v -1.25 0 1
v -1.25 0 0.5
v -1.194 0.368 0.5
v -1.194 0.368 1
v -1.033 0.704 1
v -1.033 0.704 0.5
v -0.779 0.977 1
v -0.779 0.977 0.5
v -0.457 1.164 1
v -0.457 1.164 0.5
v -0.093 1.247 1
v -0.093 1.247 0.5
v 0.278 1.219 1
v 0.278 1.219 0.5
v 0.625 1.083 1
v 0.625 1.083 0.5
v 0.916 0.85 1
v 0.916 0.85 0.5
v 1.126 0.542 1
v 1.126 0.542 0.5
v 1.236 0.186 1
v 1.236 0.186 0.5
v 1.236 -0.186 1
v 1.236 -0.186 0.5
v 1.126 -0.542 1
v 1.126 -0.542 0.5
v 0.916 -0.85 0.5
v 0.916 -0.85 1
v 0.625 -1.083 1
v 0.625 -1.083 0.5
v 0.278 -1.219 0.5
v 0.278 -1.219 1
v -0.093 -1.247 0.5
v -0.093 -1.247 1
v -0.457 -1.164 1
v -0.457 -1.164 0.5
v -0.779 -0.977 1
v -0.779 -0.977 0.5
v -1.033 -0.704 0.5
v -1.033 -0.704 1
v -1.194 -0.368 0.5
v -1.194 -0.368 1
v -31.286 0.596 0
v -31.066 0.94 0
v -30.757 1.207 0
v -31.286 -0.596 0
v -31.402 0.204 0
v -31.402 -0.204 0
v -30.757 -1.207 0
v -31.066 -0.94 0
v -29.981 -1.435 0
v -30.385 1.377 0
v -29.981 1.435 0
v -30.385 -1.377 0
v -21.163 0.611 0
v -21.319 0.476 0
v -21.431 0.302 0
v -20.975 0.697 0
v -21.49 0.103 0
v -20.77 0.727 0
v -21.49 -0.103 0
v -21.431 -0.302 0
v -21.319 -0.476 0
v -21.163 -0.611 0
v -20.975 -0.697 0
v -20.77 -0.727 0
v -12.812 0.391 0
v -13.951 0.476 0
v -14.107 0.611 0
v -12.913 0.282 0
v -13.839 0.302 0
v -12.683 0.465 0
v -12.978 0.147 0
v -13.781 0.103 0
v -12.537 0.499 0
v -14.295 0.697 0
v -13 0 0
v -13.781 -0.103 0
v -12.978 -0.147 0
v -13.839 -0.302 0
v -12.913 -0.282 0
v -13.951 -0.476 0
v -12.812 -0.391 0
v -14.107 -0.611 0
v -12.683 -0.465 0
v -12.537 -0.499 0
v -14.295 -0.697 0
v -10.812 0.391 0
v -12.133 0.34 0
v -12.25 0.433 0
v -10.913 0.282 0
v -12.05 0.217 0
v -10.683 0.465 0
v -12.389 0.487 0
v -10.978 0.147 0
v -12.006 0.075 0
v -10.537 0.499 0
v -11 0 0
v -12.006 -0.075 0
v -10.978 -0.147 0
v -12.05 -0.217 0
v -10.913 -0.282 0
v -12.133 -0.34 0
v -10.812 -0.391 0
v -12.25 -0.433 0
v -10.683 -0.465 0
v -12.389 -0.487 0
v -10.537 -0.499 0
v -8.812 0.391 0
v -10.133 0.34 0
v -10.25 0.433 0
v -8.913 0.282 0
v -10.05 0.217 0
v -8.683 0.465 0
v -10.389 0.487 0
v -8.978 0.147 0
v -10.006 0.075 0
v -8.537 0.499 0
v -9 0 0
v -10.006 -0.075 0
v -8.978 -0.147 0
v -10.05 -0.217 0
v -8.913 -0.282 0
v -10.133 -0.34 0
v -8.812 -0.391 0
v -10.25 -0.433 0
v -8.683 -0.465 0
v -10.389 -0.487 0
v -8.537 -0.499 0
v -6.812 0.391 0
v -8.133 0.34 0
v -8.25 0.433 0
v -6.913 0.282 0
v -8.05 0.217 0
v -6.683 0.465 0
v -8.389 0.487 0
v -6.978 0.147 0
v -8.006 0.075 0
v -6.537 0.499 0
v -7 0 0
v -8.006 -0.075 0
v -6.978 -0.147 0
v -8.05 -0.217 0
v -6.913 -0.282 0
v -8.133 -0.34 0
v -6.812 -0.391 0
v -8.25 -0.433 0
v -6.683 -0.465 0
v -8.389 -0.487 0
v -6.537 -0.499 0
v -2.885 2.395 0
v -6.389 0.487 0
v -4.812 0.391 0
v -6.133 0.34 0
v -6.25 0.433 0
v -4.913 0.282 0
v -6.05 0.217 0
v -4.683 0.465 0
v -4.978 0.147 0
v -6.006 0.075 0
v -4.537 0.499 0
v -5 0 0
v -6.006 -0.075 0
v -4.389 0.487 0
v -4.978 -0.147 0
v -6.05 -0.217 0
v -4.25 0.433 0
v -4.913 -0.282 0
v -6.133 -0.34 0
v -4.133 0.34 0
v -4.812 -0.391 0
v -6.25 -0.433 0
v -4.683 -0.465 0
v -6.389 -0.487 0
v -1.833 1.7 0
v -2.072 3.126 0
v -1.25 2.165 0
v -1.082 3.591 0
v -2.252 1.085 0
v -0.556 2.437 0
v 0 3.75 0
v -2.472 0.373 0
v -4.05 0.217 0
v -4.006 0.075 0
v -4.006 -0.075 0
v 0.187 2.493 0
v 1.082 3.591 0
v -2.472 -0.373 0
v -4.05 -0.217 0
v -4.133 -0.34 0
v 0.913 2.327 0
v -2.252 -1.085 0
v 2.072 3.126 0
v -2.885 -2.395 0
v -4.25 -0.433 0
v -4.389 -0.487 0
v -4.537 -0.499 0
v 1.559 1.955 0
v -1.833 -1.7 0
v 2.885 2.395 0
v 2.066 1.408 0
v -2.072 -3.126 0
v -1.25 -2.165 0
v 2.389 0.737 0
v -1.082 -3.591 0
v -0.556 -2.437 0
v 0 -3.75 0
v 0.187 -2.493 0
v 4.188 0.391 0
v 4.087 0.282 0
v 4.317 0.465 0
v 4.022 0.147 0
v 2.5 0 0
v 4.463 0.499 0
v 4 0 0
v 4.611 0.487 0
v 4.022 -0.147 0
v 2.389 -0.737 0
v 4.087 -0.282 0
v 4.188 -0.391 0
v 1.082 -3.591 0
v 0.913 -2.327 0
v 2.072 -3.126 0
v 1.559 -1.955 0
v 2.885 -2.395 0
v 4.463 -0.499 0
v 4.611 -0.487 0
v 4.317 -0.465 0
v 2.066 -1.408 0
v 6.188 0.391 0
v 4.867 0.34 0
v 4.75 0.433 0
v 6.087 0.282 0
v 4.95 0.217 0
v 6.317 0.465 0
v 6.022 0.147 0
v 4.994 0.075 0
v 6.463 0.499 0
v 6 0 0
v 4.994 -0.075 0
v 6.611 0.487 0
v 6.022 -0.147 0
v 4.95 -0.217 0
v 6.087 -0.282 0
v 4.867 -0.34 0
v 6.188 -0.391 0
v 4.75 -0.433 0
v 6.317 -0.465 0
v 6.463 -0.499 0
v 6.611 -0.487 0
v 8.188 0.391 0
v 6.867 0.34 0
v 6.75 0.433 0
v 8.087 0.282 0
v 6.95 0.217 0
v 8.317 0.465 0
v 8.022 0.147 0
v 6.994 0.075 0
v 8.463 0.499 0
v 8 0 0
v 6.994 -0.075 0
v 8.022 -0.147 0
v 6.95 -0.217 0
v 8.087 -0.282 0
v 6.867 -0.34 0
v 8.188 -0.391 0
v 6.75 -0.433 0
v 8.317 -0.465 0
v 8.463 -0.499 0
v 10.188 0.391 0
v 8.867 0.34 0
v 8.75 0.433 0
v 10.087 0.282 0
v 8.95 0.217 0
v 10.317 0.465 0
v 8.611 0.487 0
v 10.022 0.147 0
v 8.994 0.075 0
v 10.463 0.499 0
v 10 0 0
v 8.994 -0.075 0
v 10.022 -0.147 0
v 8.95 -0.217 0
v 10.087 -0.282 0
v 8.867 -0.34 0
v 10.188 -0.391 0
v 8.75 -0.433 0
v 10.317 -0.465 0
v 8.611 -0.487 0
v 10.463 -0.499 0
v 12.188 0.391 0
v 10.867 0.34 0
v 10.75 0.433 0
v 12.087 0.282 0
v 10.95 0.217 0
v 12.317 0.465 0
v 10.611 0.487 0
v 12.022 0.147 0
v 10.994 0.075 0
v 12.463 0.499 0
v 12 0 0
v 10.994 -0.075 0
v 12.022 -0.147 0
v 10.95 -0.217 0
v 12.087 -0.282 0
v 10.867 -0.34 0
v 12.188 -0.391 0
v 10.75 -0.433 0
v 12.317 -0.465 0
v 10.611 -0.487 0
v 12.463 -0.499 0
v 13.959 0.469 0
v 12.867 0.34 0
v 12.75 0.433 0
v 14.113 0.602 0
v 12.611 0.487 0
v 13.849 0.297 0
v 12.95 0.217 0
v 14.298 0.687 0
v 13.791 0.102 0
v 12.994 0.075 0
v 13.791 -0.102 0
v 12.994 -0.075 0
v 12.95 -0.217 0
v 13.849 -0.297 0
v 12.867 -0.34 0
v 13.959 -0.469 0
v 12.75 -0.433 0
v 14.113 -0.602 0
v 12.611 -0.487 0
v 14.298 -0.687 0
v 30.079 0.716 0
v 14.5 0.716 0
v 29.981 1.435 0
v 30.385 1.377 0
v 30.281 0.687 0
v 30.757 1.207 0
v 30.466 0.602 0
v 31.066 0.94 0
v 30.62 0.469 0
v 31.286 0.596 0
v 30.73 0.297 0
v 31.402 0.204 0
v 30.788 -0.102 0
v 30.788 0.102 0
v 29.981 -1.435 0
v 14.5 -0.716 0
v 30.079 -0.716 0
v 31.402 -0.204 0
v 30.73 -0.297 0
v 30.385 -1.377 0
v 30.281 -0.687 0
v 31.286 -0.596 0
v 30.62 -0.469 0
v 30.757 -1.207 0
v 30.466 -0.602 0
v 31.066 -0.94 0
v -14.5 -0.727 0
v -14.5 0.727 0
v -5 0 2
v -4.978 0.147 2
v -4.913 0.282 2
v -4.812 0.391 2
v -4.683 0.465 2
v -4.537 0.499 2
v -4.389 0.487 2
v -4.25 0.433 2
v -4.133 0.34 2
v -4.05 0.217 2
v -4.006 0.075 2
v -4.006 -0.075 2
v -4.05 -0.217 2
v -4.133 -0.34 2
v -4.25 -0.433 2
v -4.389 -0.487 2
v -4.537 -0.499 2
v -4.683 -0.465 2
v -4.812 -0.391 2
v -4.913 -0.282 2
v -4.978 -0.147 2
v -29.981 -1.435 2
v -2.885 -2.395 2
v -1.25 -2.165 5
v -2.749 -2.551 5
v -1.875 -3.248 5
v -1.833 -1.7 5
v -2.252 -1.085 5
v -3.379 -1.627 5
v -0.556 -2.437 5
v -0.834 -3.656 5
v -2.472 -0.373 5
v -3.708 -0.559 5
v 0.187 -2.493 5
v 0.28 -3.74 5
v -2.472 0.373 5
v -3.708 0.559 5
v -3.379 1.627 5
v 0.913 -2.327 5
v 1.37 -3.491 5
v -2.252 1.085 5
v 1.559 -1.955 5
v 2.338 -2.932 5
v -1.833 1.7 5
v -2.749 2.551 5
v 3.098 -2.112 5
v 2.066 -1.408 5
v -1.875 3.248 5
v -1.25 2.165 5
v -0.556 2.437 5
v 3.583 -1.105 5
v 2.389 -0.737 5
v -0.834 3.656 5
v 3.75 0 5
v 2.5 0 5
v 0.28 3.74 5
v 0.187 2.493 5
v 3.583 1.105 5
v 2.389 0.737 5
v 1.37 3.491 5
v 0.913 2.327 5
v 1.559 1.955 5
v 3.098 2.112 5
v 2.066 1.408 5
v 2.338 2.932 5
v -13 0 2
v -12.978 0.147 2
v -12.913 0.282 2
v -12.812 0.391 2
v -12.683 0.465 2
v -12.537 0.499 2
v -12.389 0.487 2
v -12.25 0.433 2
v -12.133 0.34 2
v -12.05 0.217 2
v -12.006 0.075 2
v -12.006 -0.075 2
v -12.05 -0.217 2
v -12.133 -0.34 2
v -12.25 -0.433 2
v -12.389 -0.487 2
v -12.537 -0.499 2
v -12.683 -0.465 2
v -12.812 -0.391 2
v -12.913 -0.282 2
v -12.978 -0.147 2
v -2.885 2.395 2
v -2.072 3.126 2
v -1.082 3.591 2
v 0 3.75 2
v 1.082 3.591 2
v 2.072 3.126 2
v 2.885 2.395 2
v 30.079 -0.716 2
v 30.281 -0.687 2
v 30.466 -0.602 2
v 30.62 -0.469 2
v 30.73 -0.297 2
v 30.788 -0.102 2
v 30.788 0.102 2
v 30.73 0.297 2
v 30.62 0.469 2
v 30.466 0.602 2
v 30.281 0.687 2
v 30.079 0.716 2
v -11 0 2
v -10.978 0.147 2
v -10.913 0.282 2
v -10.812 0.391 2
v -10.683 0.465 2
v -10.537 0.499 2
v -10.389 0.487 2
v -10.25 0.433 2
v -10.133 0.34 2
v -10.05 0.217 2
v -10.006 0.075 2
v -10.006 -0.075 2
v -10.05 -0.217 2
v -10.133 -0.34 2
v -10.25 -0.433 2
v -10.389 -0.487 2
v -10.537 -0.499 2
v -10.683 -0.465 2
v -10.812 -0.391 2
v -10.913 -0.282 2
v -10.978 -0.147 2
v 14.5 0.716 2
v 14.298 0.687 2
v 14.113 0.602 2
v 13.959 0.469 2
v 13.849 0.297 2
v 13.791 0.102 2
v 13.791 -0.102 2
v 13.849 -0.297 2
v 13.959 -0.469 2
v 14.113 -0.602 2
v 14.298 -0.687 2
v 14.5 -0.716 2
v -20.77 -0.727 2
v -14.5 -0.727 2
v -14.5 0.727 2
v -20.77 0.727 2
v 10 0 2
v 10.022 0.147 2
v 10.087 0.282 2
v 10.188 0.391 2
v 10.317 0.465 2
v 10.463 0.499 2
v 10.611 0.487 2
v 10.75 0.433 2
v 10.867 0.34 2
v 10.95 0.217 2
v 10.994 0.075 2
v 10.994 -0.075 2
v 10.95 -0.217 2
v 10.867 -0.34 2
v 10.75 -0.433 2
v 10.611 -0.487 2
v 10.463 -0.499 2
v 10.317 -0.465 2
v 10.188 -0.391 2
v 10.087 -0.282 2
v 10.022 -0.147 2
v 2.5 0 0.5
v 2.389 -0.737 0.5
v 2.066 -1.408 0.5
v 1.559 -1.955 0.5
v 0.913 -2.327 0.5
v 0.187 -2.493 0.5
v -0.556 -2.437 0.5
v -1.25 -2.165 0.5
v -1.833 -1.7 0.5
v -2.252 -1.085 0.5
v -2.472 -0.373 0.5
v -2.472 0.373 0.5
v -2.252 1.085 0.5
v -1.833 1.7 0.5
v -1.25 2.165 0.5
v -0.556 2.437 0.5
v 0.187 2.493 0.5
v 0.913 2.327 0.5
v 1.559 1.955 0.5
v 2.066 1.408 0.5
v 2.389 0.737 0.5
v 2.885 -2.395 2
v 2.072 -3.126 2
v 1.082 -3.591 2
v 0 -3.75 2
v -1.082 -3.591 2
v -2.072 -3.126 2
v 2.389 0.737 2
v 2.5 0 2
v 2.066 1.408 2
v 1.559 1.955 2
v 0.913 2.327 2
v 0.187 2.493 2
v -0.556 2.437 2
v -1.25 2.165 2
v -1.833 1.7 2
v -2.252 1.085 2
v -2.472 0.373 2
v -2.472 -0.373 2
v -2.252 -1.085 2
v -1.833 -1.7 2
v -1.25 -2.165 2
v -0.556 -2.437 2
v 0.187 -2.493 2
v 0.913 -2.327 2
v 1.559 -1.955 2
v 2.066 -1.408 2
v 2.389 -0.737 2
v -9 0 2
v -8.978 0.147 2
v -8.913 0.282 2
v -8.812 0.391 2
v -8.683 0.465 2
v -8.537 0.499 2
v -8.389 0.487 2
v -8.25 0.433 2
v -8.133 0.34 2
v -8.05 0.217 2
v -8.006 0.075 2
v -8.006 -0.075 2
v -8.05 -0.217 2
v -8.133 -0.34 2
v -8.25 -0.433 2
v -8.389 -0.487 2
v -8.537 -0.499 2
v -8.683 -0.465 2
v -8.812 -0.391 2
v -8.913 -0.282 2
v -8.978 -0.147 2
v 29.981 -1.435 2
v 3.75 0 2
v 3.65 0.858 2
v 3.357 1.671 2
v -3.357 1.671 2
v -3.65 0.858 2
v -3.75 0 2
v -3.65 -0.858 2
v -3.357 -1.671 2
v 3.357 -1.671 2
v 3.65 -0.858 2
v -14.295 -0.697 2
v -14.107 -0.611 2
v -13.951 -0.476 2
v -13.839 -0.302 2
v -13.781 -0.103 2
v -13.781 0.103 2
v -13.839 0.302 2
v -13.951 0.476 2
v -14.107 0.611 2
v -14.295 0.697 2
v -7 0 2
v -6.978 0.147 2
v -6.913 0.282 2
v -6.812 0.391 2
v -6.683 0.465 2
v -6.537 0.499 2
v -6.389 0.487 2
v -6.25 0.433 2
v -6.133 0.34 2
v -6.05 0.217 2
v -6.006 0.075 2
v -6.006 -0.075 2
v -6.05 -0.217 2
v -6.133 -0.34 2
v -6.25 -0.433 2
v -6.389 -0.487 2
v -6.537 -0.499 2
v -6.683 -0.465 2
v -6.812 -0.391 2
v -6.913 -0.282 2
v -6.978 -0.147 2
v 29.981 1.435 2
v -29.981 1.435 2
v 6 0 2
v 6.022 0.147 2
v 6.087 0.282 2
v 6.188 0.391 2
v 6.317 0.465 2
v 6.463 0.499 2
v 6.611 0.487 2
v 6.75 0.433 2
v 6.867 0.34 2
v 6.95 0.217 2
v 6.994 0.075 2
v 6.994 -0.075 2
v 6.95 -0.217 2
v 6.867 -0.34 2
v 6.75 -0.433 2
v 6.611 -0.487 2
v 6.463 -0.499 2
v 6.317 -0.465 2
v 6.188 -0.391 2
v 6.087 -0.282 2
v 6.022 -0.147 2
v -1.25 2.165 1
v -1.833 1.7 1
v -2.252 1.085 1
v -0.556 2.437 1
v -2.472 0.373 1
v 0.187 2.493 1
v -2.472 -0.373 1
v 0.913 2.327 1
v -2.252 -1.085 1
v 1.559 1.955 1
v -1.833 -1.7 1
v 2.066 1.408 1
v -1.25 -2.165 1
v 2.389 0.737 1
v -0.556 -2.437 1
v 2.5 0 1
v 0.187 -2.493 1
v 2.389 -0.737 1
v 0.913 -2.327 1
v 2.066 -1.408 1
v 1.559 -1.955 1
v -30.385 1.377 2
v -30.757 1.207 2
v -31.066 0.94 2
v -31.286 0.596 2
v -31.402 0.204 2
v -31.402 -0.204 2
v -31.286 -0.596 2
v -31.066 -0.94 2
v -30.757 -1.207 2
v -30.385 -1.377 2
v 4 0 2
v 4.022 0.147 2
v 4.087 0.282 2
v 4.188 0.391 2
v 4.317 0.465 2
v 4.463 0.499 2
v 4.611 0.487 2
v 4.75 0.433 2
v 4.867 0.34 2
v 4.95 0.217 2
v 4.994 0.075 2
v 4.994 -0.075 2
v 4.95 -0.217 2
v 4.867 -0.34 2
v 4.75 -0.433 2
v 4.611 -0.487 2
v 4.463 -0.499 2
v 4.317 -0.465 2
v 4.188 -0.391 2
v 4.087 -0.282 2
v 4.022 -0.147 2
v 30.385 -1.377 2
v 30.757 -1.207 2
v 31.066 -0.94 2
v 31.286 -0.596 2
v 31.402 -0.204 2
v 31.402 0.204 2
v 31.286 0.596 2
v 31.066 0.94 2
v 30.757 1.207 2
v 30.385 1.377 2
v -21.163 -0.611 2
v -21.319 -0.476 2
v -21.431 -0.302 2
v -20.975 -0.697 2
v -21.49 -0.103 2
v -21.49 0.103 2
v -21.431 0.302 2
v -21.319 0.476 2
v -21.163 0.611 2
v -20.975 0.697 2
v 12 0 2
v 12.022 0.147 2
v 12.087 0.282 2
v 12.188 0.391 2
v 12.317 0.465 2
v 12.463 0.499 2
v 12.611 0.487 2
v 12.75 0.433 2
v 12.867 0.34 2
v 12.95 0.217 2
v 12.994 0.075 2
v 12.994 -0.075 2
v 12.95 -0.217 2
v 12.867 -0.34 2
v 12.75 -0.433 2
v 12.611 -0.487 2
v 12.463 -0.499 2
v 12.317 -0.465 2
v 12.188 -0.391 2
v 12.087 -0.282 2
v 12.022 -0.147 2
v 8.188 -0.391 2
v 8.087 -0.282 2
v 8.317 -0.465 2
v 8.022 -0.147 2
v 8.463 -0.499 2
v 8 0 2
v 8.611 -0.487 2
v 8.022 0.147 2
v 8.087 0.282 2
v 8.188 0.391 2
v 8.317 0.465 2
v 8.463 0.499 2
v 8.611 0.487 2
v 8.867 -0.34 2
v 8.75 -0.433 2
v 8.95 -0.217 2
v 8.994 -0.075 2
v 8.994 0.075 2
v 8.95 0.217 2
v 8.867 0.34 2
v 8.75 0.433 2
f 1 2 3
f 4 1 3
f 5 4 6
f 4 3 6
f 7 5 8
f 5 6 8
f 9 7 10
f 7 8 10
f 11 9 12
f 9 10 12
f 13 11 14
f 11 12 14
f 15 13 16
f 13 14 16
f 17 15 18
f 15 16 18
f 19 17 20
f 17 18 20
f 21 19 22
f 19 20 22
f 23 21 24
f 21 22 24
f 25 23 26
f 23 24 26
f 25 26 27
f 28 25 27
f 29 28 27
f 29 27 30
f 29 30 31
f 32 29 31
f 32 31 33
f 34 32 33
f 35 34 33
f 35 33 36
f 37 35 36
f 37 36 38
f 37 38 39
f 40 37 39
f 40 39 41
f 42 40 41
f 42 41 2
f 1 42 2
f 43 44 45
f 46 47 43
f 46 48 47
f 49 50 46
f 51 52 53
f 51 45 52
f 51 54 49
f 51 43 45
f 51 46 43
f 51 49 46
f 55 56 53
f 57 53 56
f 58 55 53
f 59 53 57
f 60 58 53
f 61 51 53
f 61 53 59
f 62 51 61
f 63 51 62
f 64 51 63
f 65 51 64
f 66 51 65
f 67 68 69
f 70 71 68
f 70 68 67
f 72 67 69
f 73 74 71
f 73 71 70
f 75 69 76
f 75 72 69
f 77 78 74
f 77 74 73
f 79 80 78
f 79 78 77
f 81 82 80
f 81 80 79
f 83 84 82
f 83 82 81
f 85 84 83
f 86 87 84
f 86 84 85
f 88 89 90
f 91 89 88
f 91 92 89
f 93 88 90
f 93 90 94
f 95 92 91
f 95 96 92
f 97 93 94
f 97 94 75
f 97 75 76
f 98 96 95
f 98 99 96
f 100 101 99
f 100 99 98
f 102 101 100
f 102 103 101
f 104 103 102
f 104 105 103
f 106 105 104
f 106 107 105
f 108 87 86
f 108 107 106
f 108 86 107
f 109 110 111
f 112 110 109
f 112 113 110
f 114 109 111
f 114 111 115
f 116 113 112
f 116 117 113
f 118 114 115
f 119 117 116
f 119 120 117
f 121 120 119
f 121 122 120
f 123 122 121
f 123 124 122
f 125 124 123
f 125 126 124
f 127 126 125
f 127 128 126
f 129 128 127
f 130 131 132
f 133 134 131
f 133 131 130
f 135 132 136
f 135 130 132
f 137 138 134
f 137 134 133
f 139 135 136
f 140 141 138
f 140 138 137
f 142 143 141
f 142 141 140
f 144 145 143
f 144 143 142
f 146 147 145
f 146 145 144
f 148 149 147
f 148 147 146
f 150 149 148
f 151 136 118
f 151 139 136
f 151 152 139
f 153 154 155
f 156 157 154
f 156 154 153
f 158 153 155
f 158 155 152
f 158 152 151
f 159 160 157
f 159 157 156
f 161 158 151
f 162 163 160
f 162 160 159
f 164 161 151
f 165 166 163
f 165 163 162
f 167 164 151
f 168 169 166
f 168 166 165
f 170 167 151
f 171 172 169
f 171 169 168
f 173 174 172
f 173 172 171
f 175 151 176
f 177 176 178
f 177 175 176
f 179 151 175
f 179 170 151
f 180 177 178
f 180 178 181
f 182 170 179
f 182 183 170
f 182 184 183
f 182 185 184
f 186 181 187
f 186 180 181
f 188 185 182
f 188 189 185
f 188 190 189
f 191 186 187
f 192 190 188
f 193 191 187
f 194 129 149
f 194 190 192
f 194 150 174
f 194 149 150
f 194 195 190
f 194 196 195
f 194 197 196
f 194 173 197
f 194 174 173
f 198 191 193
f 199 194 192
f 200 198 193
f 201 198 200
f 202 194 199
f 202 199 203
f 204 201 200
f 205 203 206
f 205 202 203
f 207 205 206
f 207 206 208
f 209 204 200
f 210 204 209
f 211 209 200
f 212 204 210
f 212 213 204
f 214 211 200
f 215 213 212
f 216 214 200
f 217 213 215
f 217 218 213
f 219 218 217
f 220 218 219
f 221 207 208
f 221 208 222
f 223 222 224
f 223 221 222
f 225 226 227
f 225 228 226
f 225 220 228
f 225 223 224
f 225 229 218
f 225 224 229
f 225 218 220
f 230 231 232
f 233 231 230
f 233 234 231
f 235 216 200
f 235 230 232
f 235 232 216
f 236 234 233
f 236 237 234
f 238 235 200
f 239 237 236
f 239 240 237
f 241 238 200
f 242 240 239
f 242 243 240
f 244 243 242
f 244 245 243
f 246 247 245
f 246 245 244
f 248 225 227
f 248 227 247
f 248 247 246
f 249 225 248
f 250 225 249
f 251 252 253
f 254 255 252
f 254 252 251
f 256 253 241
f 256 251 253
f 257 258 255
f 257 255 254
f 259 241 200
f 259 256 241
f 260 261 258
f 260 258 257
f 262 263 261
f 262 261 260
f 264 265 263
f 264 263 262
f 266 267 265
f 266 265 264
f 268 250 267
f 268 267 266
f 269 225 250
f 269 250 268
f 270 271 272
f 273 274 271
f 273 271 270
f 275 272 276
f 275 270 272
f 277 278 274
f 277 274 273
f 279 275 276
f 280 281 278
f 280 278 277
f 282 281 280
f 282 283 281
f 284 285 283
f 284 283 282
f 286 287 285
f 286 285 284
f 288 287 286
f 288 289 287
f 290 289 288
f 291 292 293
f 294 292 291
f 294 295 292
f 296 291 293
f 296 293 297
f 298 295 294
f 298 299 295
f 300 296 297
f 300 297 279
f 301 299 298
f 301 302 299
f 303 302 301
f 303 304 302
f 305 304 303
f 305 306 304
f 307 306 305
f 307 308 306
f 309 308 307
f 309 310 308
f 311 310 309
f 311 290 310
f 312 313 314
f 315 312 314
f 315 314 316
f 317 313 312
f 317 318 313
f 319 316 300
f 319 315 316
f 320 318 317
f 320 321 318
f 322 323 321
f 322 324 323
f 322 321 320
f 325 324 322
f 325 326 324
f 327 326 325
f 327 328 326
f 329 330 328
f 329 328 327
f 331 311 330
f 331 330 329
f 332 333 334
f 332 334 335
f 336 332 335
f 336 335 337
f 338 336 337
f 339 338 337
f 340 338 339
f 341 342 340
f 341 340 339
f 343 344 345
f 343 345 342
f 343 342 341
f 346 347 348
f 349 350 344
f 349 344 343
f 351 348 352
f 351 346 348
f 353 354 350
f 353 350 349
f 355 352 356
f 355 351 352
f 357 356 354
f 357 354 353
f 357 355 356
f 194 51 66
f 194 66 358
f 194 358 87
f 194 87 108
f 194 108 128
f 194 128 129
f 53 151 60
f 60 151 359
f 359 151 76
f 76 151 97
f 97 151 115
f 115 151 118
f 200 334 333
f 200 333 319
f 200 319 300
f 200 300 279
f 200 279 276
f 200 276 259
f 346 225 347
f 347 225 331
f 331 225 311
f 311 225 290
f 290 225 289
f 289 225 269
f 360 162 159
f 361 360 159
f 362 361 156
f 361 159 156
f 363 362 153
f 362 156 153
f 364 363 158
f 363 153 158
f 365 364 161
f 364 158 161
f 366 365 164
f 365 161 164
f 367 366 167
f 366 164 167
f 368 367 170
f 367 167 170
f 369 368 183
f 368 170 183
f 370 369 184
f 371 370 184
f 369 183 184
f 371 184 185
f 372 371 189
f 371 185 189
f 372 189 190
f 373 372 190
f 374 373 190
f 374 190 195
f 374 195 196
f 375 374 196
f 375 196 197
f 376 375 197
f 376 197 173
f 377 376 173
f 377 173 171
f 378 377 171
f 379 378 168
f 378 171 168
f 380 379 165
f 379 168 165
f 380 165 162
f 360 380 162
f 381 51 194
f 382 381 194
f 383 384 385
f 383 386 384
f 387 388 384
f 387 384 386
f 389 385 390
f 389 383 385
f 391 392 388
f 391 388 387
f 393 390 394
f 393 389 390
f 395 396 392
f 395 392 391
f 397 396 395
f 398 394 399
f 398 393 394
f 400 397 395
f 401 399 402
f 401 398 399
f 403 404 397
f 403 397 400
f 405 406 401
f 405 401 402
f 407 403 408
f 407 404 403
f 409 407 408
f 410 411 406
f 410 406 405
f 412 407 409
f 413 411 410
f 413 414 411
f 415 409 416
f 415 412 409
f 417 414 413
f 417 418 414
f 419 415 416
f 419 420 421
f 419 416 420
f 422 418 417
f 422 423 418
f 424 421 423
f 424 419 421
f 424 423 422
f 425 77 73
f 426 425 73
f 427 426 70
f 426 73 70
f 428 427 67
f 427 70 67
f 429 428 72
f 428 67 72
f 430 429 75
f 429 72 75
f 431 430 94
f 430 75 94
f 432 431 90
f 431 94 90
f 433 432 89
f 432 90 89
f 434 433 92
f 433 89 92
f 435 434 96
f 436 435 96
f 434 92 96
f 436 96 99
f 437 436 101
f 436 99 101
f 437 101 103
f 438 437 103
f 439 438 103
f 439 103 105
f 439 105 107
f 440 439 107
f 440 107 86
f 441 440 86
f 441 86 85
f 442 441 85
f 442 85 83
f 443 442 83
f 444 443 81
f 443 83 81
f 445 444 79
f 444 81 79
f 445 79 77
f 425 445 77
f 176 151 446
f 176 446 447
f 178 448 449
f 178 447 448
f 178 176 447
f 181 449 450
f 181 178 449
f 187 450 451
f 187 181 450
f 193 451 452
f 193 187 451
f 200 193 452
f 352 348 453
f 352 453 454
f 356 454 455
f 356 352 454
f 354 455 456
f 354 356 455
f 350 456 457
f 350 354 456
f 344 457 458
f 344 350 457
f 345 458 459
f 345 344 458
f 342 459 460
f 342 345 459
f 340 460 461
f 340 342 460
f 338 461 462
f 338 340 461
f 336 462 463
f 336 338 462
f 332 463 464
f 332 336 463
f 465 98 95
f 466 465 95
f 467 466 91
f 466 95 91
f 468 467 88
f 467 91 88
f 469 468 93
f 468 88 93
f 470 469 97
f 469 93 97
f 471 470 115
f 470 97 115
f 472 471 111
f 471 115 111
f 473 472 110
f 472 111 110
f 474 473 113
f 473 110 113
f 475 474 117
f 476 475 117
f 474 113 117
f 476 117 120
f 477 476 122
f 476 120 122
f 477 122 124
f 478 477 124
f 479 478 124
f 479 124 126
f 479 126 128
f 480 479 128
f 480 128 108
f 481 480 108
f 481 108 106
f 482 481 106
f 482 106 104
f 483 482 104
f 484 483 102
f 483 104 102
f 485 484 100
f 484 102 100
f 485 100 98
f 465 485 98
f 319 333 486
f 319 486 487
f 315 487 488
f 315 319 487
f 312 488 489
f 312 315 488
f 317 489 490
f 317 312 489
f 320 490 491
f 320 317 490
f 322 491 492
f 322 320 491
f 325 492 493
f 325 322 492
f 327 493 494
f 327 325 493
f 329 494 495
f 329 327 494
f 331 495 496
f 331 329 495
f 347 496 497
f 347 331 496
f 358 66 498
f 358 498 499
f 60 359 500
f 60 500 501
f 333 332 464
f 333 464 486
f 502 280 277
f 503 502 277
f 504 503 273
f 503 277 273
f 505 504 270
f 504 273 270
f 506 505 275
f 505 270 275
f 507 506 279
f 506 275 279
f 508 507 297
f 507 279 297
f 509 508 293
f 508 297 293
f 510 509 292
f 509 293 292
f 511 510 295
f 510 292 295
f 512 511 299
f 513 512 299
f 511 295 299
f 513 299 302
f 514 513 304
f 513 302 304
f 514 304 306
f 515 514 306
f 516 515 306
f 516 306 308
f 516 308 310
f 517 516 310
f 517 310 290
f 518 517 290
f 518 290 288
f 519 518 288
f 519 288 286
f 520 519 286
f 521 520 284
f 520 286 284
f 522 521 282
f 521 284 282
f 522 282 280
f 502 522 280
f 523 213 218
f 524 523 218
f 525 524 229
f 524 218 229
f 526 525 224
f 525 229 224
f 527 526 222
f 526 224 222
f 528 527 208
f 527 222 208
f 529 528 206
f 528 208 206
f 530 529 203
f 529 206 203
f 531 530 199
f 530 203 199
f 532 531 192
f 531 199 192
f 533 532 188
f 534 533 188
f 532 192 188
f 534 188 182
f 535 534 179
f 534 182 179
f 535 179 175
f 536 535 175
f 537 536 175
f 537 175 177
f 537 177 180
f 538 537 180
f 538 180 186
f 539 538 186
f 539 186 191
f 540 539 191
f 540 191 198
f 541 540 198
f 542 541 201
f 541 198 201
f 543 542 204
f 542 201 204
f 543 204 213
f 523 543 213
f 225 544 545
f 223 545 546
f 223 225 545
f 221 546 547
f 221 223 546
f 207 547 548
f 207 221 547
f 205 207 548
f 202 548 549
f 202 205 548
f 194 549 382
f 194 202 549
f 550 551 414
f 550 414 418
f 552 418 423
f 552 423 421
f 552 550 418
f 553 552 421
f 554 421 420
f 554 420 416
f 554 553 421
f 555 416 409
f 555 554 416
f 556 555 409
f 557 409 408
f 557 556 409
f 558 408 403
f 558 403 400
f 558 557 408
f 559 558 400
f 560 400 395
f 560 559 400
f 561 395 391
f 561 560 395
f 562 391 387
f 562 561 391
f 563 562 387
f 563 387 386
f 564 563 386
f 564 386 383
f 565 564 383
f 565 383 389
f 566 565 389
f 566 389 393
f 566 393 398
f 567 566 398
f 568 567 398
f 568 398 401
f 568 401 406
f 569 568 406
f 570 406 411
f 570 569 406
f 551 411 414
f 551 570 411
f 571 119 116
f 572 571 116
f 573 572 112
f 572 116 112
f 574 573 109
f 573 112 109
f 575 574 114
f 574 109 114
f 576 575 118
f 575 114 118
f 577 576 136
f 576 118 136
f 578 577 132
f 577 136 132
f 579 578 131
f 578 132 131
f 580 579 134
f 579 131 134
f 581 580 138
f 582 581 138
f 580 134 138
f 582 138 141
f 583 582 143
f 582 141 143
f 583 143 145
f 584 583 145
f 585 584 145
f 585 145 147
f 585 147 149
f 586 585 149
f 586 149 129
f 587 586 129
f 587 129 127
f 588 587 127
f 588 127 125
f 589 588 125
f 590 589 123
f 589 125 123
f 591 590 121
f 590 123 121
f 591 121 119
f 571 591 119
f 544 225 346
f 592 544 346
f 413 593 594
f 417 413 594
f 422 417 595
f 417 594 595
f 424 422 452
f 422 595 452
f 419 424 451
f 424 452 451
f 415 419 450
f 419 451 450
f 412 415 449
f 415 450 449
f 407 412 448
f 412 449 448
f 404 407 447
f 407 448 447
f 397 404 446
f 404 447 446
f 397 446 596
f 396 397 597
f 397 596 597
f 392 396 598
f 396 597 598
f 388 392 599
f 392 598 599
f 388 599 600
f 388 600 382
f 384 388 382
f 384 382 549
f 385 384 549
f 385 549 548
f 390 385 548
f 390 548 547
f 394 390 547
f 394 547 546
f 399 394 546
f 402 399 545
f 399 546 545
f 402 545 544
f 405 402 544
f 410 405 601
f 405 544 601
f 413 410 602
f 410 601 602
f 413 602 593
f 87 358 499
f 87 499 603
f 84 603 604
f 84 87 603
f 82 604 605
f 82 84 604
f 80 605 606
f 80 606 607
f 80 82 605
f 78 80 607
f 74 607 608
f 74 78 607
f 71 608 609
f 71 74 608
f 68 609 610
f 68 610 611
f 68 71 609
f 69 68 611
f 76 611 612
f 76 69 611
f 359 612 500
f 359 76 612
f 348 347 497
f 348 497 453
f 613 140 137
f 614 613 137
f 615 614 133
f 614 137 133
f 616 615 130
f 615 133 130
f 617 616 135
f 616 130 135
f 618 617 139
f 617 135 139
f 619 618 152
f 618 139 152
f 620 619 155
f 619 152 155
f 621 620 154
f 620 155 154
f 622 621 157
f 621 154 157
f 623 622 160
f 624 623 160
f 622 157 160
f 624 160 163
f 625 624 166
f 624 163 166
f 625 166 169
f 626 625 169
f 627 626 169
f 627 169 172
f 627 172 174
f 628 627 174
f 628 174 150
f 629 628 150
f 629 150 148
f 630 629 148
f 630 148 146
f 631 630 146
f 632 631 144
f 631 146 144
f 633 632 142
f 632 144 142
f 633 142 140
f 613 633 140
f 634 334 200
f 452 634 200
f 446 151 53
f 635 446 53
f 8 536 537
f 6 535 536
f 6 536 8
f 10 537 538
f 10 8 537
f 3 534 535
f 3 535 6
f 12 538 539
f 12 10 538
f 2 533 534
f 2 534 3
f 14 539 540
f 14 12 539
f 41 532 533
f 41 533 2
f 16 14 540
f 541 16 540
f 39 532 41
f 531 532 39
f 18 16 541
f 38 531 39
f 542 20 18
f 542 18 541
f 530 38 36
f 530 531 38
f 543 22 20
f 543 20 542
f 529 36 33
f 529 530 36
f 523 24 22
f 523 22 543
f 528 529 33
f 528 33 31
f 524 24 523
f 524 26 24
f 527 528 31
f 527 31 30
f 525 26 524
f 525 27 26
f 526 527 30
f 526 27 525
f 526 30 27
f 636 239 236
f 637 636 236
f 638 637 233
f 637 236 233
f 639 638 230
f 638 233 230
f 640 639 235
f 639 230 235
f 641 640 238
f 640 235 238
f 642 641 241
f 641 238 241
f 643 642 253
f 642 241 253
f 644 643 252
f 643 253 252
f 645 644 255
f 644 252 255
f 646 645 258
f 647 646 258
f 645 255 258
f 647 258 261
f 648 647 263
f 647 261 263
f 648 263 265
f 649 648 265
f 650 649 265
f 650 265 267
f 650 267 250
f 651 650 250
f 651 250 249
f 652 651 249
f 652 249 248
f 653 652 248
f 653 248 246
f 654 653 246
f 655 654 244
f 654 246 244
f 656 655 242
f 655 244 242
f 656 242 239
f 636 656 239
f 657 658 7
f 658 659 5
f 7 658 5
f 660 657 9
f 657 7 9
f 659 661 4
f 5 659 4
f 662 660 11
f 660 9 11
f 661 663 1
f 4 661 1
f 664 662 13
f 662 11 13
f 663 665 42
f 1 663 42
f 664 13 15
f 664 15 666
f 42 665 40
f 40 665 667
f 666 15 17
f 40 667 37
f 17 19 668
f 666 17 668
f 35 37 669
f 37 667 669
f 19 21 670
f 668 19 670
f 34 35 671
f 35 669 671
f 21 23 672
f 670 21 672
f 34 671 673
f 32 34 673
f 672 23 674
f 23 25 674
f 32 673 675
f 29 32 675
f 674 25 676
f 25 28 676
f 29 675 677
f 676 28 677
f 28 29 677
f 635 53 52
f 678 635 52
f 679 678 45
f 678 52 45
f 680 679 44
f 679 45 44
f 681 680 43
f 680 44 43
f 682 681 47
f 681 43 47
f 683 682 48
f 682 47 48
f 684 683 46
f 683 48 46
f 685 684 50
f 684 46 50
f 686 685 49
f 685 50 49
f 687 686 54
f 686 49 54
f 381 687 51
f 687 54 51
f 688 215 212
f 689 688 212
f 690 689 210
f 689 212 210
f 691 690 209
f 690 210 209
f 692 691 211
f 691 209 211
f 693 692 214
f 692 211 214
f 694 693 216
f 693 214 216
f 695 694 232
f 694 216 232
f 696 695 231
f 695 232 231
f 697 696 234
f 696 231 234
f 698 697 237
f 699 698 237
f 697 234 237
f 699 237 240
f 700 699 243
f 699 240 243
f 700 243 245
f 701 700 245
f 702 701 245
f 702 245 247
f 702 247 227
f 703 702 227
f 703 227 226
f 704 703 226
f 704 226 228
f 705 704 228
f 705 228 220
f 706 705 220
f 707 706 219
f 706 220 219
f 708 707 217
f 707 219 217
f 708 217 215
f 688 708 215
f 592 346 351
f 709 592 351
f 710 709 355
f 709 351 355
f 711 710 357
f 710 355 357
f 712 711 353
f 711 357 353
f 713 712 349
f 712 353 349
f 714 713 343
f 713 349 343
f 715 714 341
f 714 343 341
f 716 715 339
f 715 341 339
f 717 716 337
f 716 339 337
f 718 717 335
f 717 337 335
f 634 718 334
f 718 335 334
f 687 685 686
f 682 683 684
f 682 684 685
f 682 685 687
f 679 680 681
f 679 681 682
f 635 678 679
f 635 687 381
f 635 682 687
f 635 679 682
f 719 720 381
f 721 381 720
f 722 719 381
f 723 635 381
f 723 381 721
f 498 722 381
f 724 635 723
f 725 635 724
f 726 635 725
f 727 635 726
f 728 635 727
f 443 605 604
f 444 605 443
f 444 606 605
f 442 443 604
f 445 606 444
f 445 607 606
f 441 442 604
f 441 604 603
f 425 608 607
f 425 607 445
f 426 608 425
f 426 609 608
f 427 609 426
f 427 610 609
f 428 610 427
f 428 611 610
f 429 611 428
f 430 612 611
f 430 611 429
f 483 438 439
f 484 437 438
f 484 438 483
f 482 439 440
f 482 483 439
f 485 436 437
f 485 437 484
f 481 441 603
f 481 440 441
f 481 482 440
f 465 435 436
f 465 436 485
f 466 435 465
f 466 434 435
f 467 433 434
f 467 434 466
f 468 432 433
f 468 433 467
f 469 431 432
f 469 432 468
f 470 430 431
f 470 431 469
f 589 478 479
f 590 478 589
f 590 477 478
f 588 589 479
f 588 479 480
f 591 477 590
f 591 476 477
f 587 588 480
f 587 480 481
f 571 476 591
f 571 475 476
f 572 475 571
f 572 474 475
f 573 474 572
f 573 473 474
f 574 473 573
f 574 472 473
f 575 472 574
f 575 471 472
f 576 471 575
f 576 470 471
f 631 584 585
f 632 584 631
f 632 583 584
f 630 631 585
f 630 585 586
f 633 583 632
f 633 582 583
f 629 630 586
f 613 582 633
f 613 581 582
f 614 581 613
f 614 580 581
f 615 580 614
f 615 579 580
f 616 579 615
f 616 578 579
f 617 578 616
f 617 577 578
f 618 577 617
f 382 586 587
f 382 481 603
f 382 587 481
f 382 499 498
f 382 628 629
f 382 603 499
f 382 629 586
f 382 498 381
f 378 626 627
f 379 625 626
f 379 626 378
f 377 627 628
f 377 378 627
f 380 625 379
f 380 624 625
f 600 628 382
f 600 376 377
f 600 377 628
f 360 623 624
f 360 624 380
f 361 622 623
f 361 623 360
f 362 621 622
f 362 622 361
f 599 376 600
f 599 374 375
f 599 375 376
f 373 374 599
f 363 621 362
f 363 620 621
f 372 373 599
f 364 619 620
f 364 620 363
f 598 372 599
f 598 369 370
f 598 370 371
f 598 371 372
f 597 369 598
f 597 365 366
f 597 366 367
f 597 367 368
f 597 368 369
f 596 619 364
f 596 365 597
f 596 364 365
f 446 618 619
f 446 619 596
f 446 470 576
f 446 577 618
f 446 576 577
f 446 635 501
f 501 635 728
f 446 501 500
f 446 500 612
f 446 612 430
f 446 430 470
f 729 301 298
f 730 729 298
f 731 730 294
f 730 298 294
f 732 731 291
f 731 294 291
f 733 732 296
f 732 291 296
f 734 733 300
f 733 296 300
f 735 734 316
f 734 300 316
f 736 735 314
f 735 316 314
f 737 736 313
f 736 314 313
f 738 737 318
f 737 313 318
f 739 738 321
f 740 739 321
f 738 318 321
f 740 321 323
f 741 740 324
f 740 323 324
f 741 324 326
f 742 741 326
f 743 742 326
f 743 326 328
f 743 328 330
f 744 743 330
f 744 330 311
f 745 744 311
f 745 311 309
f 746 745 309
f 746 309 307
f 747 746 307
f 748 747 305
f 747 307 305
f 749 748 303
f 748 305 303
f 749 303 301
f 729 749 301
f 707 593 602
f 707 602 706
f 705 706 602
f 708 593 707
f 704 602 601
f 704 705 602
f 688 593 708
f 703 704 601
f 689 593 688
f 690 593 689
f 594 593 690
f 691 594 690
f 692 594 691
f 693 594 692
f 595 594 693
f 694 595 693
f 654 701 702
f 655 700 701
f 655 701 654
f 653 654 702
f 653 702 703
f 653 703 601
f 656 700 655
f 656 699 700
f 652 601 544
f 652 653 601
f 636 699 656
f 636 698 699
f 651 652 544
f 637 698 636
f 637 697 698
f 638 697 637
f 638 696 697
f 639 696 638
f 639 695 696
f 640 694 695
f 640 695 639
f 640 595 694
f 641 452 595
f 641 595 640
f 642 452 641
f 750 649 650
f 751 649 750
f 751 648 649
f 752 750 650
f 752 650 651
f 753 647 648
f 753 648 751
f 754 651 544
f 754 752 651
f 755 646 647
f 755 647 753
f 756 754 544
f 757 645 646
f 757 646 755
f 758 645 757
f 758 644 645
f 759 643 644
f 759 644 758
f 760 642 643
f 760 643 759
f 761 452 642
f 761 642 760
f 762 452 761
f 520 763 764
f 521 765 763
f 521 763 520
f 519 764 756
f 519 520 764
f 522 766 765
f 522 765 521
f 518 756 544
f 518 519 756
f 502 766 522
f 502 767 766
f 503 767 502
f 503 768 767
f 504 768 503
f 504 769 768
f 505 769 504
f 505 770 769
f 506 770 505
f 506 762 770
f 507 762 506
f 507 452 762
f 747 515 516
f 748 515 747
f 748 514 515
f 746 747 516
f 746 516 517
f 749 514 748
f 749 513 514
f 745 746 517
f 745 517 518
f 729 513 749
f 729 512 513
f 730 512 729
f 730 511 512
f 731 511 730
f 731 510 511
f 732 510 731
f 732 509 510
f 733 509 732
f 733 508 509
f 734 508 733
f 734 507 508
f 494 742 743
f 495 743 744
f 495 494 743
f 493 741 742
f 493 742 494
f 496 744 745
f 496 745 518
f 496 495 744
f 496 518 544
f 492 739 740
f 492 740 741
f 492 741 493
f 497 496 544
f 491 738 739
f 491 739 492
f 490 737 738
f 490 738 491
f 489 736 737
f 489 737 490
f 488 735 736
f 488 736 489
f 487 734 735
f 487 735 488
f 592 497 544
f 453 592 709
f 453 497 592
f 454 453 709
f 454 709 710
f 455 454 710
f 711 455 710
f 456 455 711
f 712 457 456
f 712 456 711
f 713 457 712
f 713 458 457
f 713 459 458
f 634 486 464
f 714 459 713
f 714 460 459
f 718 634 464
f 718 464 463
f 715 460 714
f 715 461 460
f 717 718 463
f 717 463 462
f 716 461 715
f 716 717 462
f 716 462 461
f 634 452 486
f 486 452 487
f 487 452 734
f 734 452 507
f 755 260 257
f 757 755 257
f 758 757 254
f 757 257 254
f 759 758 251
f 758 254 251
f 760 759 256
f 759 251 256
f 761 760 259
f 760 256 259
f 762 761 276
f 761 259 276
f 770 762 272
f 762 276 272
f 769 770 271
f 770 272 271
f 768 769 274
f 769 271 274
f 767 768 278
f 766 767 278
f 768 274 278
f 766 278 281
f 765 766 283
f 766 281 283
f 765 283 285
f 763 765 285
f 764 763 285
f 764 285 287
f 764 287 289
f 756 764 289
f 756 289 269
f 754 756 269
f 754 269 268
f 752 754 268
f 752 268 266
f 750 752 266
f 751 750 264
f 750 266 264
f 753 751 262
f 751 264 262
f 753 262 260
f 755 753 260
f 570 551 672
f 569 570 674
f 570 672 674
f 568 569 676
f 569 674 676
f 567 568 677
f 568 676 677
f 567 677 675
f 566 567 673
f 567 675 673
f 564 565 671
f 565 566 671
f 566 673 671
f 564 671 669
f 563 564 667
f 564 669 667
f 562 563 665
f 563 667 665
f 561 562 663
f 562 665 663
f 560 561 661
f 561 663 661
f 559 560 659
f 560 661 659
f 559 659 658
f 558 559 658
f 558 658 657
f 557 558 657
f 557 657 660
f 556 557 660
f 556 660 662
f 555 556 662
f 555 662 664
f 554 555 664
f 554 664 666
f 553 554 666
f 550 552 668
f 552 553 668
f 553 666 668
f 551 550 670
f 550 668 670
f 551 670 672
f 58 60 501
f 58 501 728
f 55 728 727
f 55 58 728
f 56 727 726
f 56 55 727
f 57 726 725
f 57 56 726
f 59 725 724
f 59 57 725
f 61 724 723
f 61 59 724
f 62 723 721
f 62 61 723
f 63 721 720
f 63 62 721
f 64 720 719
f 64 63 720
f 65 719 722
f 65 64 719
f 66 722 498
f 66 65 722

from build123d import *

# Parameters (mm, degrees)
EXTRUDE_3_DEPTH     = 2
EXTRUDE_3_2_DEPTH   = 2
SKETCH_2_R          = 3.75
SKETCH_2_R_2        = 2.5
EXTRUDE_5_DEPTH     = 3
EXTRUDE_START       = 2
SKETCH_3_R          = 3.75
SKETCH_3_R_2        = 2.5
EXTRUDE_6_DEPTH     = 2
SKETCH_4_R          = 0.5
CUT_EXTRUDE_1_DEPTH = 2
SKETCH_5_R          = 2.5
EXTRUDE_7_DEPTH     = 1
SKETCH_6_R          = 2.5
CUT_EXTRUDE_2_DEPTH = 0.5
SKETCH_7_R          = 1.25
CUT_EXTRUDE_3_DEPTH = 5
CUT_EXTRUDE2_DEPTH  = 2


with BuildPart() as part:
    # Эскиз1 → Бобышка-Вытянуть3 (new body)
    with BuildSketch(Plane.XY):
        with BuildLine():
            ThreePointArc((-2.88547071, -2.395111434), (-3.527252129, -1.273182005), (-3.75, 0))
            ThreePointArc((-3.75, 0), (-3.527252129, 1.273182005), (-2.88547071, 2.395111434))
            Line((-2.88547071, 2.395111434), (-29.981181912, 1.434943796))
            ThreePointArc((-29.981181912, 1.434943796), (-31.416125708, 0), (-29.981181912, -1.434943796))
            Line((-29.981181912, -1.434943796), (-2.88547071, -2.395111434))
        make_face()
    extrude(amount=EXTRUDE_3_DEPTH)



with BuildPart() as body_2:
    # Эскиз1 → Extrude 3 2 (new body)
    with BuildSketch(Plane.XY):
        with BuildLine():
            Line((29.981181912, 1.434943796), (2.88547071, 2.395111434))
            ThreePointArc((2.88547071, 2.395111434), (3.75, 0), (2.88547071, -2.395111434))
            Line((2.88547071, -2.395111434), (29.981181912, -1.434943796))
            ThreePointArc((29.981181912, -1.434943796), (31.416125708, 0), (29.981181912, 1.434943796))
        make_face()
    extrude(amount=EXTRUDE_3_2_DEPTH)


with BuildPart() as body_3:
    # Эскиз2 → Бобышка-Вытянуть5 (new body)
    with BuildSketch(Plane.XY.offset(2)):
        Circle(SKETCH_2_R)
        Circle(SKETCH_2_R_2, mode=Mode.SUBTRACT)
    extrude(amount=EXTRUDE_5_DEPTH)


with BuildPart() as part_1:
    add(part.part)

    add(body_2.part)  # Бобышка-Вытянуть6 merges body 2

    add(body_3.part)  # Бобышка-Вытянуть6 merges body 3
    # Эскиз3 → Бобышка-Вытянуть6 (add)
    with BuildSketch(Plane(origin=(0, 0, 2), x_dir=(-1, 0, 0), z_dir=(0, 0, -1)).offset(EXTRUDE_START)):
        with Locations(Location((0, 0, 0), (0, 0, 180))):
            Circle(SKETCH_3_R)
        with Locations(Location((0, 0, 0), (0, 0, 180))):
            Circle(SKETCH_3_R_2, mode=Mode.SUBTRACT)
    extrude(amount=-EXTRUDE_6_DEPTH)

    # Эскиз4 → Вырез-Вытянуть1 (cut)
    with BuildSketch(Plane(origin=(0, 0, 0), x_dir=(-1, 0, 0), z_dir=(0, 0, -1))):
        with Locations((-14.5, 0)):
            Circle(SKETCH_4_R)
        with Locations((-4.5, 0)):
            Circle(SKETCH_4_R)
        with Locations((-6.5, 0)):
            Circle(SKETCH_4_R)
        with Locations((-8.5, 0)):
            Circle(SKETCH_4_R)
        with Locations((-10.5, 0)):
            Circle(SKETCH_4_R)
        with Locations((-12.5, 0)):
            Circle(SKETCH_4_R)
        with Locations((4.5, 0)):
            Circle(SKETCH_4_R)
        with Locations((6.5, 0)):
            Circle(SKETCH_4_R)
        with Locations((8.5, 0)):
            Circle(SKETCH_4_R)
        with Locations((10.5, 0)):
            Circle(SKETCH_4_R)
        with Locations((12.5, 0)):
            Circle(SKETCH_4_R)
        with Locations((14.5, 0)):
            Circle(SKETCH_4_R)
    extrude(amount=-CUT_EXTRUDE_1_DEPTH, mode=Mode.SUBTRACT)

    # Эскиз5 → Бобышка-Вытянуть7 (add)
    with BuildSketch(Plane(origin=(0, 0, 0), x_dir=(-1, 0, 0), z_dir=(0, 0, -1))):
        with Locations(Location((0, 0, 0), (0, 0, 180))):
            Circle(SKETCH_5_R)
    extrude(amount=-EXTRUDE_7_DEPTH)

    # Эскиз6 → Вырез-Вытянуть2 (cut)
    with BuildSketch(Plane(origin=(0, 0, 0), x_dir=(-1, 0, 0), z_dir=(0, 0, -1))):
        with Locations(Location((0, 0, 0), (0, 0, 180))):
            Circle(SKETCH_6_R)
    extrude(amount=-CUT_EXTRUDE_2_DEPTH, mode=Mode.SUBTRACT)

    # Эскиз7 → Вырез-Вытянуть3 (cut)
    with BuildSketch(Plane(origin=(0, 0, 0.5), x_dir=(-1, 0, 0), z_dir=(0, 0, -1))):
        Circle(SKETCH_7_R)
    extrude(amount=-CUT_EXTRUDE_3_DEPTH, mode=Mode.SUBTRACT)

    # Sketch3 → Cut-Extrude2 (cut)
    with BuildSketch(Plane(origin=(0, 0, 0), x_dir=(-1, 0, 0), z_dir=(0, 0, -1))):
        with BuildLine():
            Line((20.770262951, -0.726731665), (14.5, -0.726731665))
            ThreePointArc((14.5, -0.726731665), (13.773268335, 0), (14.5, 0.726731665))
            Line((14.5, 0.726731665), (20.770262951, 0.726731665))
            ThreePointArc((20.770262951, 0.726731665), (21.496994893, 2.77e-07), (20.770262951, -0.726731665))
        make_face()
        with BuildLine():
            Line((-14.5, -0.716032824), (-30.079105353, -0.716032824))
            ThreePointArc((-30.079105353, -0.716032824), (-30.795138177, 0), (-30.079105353, 0.716032824))
            Line((-30.079105353, 0.716032824), (-14.5, 0.716032824))
            ThreePointArc((-14.5, 0.716032824), (-13.783967176, 0), (-14.5, -0.716032824))
        make_face()
    extrude(amount=-CUT_EXTRUDE2_DEPTH, mode=Mode.SUBTRACT)


solid = part_1.part
